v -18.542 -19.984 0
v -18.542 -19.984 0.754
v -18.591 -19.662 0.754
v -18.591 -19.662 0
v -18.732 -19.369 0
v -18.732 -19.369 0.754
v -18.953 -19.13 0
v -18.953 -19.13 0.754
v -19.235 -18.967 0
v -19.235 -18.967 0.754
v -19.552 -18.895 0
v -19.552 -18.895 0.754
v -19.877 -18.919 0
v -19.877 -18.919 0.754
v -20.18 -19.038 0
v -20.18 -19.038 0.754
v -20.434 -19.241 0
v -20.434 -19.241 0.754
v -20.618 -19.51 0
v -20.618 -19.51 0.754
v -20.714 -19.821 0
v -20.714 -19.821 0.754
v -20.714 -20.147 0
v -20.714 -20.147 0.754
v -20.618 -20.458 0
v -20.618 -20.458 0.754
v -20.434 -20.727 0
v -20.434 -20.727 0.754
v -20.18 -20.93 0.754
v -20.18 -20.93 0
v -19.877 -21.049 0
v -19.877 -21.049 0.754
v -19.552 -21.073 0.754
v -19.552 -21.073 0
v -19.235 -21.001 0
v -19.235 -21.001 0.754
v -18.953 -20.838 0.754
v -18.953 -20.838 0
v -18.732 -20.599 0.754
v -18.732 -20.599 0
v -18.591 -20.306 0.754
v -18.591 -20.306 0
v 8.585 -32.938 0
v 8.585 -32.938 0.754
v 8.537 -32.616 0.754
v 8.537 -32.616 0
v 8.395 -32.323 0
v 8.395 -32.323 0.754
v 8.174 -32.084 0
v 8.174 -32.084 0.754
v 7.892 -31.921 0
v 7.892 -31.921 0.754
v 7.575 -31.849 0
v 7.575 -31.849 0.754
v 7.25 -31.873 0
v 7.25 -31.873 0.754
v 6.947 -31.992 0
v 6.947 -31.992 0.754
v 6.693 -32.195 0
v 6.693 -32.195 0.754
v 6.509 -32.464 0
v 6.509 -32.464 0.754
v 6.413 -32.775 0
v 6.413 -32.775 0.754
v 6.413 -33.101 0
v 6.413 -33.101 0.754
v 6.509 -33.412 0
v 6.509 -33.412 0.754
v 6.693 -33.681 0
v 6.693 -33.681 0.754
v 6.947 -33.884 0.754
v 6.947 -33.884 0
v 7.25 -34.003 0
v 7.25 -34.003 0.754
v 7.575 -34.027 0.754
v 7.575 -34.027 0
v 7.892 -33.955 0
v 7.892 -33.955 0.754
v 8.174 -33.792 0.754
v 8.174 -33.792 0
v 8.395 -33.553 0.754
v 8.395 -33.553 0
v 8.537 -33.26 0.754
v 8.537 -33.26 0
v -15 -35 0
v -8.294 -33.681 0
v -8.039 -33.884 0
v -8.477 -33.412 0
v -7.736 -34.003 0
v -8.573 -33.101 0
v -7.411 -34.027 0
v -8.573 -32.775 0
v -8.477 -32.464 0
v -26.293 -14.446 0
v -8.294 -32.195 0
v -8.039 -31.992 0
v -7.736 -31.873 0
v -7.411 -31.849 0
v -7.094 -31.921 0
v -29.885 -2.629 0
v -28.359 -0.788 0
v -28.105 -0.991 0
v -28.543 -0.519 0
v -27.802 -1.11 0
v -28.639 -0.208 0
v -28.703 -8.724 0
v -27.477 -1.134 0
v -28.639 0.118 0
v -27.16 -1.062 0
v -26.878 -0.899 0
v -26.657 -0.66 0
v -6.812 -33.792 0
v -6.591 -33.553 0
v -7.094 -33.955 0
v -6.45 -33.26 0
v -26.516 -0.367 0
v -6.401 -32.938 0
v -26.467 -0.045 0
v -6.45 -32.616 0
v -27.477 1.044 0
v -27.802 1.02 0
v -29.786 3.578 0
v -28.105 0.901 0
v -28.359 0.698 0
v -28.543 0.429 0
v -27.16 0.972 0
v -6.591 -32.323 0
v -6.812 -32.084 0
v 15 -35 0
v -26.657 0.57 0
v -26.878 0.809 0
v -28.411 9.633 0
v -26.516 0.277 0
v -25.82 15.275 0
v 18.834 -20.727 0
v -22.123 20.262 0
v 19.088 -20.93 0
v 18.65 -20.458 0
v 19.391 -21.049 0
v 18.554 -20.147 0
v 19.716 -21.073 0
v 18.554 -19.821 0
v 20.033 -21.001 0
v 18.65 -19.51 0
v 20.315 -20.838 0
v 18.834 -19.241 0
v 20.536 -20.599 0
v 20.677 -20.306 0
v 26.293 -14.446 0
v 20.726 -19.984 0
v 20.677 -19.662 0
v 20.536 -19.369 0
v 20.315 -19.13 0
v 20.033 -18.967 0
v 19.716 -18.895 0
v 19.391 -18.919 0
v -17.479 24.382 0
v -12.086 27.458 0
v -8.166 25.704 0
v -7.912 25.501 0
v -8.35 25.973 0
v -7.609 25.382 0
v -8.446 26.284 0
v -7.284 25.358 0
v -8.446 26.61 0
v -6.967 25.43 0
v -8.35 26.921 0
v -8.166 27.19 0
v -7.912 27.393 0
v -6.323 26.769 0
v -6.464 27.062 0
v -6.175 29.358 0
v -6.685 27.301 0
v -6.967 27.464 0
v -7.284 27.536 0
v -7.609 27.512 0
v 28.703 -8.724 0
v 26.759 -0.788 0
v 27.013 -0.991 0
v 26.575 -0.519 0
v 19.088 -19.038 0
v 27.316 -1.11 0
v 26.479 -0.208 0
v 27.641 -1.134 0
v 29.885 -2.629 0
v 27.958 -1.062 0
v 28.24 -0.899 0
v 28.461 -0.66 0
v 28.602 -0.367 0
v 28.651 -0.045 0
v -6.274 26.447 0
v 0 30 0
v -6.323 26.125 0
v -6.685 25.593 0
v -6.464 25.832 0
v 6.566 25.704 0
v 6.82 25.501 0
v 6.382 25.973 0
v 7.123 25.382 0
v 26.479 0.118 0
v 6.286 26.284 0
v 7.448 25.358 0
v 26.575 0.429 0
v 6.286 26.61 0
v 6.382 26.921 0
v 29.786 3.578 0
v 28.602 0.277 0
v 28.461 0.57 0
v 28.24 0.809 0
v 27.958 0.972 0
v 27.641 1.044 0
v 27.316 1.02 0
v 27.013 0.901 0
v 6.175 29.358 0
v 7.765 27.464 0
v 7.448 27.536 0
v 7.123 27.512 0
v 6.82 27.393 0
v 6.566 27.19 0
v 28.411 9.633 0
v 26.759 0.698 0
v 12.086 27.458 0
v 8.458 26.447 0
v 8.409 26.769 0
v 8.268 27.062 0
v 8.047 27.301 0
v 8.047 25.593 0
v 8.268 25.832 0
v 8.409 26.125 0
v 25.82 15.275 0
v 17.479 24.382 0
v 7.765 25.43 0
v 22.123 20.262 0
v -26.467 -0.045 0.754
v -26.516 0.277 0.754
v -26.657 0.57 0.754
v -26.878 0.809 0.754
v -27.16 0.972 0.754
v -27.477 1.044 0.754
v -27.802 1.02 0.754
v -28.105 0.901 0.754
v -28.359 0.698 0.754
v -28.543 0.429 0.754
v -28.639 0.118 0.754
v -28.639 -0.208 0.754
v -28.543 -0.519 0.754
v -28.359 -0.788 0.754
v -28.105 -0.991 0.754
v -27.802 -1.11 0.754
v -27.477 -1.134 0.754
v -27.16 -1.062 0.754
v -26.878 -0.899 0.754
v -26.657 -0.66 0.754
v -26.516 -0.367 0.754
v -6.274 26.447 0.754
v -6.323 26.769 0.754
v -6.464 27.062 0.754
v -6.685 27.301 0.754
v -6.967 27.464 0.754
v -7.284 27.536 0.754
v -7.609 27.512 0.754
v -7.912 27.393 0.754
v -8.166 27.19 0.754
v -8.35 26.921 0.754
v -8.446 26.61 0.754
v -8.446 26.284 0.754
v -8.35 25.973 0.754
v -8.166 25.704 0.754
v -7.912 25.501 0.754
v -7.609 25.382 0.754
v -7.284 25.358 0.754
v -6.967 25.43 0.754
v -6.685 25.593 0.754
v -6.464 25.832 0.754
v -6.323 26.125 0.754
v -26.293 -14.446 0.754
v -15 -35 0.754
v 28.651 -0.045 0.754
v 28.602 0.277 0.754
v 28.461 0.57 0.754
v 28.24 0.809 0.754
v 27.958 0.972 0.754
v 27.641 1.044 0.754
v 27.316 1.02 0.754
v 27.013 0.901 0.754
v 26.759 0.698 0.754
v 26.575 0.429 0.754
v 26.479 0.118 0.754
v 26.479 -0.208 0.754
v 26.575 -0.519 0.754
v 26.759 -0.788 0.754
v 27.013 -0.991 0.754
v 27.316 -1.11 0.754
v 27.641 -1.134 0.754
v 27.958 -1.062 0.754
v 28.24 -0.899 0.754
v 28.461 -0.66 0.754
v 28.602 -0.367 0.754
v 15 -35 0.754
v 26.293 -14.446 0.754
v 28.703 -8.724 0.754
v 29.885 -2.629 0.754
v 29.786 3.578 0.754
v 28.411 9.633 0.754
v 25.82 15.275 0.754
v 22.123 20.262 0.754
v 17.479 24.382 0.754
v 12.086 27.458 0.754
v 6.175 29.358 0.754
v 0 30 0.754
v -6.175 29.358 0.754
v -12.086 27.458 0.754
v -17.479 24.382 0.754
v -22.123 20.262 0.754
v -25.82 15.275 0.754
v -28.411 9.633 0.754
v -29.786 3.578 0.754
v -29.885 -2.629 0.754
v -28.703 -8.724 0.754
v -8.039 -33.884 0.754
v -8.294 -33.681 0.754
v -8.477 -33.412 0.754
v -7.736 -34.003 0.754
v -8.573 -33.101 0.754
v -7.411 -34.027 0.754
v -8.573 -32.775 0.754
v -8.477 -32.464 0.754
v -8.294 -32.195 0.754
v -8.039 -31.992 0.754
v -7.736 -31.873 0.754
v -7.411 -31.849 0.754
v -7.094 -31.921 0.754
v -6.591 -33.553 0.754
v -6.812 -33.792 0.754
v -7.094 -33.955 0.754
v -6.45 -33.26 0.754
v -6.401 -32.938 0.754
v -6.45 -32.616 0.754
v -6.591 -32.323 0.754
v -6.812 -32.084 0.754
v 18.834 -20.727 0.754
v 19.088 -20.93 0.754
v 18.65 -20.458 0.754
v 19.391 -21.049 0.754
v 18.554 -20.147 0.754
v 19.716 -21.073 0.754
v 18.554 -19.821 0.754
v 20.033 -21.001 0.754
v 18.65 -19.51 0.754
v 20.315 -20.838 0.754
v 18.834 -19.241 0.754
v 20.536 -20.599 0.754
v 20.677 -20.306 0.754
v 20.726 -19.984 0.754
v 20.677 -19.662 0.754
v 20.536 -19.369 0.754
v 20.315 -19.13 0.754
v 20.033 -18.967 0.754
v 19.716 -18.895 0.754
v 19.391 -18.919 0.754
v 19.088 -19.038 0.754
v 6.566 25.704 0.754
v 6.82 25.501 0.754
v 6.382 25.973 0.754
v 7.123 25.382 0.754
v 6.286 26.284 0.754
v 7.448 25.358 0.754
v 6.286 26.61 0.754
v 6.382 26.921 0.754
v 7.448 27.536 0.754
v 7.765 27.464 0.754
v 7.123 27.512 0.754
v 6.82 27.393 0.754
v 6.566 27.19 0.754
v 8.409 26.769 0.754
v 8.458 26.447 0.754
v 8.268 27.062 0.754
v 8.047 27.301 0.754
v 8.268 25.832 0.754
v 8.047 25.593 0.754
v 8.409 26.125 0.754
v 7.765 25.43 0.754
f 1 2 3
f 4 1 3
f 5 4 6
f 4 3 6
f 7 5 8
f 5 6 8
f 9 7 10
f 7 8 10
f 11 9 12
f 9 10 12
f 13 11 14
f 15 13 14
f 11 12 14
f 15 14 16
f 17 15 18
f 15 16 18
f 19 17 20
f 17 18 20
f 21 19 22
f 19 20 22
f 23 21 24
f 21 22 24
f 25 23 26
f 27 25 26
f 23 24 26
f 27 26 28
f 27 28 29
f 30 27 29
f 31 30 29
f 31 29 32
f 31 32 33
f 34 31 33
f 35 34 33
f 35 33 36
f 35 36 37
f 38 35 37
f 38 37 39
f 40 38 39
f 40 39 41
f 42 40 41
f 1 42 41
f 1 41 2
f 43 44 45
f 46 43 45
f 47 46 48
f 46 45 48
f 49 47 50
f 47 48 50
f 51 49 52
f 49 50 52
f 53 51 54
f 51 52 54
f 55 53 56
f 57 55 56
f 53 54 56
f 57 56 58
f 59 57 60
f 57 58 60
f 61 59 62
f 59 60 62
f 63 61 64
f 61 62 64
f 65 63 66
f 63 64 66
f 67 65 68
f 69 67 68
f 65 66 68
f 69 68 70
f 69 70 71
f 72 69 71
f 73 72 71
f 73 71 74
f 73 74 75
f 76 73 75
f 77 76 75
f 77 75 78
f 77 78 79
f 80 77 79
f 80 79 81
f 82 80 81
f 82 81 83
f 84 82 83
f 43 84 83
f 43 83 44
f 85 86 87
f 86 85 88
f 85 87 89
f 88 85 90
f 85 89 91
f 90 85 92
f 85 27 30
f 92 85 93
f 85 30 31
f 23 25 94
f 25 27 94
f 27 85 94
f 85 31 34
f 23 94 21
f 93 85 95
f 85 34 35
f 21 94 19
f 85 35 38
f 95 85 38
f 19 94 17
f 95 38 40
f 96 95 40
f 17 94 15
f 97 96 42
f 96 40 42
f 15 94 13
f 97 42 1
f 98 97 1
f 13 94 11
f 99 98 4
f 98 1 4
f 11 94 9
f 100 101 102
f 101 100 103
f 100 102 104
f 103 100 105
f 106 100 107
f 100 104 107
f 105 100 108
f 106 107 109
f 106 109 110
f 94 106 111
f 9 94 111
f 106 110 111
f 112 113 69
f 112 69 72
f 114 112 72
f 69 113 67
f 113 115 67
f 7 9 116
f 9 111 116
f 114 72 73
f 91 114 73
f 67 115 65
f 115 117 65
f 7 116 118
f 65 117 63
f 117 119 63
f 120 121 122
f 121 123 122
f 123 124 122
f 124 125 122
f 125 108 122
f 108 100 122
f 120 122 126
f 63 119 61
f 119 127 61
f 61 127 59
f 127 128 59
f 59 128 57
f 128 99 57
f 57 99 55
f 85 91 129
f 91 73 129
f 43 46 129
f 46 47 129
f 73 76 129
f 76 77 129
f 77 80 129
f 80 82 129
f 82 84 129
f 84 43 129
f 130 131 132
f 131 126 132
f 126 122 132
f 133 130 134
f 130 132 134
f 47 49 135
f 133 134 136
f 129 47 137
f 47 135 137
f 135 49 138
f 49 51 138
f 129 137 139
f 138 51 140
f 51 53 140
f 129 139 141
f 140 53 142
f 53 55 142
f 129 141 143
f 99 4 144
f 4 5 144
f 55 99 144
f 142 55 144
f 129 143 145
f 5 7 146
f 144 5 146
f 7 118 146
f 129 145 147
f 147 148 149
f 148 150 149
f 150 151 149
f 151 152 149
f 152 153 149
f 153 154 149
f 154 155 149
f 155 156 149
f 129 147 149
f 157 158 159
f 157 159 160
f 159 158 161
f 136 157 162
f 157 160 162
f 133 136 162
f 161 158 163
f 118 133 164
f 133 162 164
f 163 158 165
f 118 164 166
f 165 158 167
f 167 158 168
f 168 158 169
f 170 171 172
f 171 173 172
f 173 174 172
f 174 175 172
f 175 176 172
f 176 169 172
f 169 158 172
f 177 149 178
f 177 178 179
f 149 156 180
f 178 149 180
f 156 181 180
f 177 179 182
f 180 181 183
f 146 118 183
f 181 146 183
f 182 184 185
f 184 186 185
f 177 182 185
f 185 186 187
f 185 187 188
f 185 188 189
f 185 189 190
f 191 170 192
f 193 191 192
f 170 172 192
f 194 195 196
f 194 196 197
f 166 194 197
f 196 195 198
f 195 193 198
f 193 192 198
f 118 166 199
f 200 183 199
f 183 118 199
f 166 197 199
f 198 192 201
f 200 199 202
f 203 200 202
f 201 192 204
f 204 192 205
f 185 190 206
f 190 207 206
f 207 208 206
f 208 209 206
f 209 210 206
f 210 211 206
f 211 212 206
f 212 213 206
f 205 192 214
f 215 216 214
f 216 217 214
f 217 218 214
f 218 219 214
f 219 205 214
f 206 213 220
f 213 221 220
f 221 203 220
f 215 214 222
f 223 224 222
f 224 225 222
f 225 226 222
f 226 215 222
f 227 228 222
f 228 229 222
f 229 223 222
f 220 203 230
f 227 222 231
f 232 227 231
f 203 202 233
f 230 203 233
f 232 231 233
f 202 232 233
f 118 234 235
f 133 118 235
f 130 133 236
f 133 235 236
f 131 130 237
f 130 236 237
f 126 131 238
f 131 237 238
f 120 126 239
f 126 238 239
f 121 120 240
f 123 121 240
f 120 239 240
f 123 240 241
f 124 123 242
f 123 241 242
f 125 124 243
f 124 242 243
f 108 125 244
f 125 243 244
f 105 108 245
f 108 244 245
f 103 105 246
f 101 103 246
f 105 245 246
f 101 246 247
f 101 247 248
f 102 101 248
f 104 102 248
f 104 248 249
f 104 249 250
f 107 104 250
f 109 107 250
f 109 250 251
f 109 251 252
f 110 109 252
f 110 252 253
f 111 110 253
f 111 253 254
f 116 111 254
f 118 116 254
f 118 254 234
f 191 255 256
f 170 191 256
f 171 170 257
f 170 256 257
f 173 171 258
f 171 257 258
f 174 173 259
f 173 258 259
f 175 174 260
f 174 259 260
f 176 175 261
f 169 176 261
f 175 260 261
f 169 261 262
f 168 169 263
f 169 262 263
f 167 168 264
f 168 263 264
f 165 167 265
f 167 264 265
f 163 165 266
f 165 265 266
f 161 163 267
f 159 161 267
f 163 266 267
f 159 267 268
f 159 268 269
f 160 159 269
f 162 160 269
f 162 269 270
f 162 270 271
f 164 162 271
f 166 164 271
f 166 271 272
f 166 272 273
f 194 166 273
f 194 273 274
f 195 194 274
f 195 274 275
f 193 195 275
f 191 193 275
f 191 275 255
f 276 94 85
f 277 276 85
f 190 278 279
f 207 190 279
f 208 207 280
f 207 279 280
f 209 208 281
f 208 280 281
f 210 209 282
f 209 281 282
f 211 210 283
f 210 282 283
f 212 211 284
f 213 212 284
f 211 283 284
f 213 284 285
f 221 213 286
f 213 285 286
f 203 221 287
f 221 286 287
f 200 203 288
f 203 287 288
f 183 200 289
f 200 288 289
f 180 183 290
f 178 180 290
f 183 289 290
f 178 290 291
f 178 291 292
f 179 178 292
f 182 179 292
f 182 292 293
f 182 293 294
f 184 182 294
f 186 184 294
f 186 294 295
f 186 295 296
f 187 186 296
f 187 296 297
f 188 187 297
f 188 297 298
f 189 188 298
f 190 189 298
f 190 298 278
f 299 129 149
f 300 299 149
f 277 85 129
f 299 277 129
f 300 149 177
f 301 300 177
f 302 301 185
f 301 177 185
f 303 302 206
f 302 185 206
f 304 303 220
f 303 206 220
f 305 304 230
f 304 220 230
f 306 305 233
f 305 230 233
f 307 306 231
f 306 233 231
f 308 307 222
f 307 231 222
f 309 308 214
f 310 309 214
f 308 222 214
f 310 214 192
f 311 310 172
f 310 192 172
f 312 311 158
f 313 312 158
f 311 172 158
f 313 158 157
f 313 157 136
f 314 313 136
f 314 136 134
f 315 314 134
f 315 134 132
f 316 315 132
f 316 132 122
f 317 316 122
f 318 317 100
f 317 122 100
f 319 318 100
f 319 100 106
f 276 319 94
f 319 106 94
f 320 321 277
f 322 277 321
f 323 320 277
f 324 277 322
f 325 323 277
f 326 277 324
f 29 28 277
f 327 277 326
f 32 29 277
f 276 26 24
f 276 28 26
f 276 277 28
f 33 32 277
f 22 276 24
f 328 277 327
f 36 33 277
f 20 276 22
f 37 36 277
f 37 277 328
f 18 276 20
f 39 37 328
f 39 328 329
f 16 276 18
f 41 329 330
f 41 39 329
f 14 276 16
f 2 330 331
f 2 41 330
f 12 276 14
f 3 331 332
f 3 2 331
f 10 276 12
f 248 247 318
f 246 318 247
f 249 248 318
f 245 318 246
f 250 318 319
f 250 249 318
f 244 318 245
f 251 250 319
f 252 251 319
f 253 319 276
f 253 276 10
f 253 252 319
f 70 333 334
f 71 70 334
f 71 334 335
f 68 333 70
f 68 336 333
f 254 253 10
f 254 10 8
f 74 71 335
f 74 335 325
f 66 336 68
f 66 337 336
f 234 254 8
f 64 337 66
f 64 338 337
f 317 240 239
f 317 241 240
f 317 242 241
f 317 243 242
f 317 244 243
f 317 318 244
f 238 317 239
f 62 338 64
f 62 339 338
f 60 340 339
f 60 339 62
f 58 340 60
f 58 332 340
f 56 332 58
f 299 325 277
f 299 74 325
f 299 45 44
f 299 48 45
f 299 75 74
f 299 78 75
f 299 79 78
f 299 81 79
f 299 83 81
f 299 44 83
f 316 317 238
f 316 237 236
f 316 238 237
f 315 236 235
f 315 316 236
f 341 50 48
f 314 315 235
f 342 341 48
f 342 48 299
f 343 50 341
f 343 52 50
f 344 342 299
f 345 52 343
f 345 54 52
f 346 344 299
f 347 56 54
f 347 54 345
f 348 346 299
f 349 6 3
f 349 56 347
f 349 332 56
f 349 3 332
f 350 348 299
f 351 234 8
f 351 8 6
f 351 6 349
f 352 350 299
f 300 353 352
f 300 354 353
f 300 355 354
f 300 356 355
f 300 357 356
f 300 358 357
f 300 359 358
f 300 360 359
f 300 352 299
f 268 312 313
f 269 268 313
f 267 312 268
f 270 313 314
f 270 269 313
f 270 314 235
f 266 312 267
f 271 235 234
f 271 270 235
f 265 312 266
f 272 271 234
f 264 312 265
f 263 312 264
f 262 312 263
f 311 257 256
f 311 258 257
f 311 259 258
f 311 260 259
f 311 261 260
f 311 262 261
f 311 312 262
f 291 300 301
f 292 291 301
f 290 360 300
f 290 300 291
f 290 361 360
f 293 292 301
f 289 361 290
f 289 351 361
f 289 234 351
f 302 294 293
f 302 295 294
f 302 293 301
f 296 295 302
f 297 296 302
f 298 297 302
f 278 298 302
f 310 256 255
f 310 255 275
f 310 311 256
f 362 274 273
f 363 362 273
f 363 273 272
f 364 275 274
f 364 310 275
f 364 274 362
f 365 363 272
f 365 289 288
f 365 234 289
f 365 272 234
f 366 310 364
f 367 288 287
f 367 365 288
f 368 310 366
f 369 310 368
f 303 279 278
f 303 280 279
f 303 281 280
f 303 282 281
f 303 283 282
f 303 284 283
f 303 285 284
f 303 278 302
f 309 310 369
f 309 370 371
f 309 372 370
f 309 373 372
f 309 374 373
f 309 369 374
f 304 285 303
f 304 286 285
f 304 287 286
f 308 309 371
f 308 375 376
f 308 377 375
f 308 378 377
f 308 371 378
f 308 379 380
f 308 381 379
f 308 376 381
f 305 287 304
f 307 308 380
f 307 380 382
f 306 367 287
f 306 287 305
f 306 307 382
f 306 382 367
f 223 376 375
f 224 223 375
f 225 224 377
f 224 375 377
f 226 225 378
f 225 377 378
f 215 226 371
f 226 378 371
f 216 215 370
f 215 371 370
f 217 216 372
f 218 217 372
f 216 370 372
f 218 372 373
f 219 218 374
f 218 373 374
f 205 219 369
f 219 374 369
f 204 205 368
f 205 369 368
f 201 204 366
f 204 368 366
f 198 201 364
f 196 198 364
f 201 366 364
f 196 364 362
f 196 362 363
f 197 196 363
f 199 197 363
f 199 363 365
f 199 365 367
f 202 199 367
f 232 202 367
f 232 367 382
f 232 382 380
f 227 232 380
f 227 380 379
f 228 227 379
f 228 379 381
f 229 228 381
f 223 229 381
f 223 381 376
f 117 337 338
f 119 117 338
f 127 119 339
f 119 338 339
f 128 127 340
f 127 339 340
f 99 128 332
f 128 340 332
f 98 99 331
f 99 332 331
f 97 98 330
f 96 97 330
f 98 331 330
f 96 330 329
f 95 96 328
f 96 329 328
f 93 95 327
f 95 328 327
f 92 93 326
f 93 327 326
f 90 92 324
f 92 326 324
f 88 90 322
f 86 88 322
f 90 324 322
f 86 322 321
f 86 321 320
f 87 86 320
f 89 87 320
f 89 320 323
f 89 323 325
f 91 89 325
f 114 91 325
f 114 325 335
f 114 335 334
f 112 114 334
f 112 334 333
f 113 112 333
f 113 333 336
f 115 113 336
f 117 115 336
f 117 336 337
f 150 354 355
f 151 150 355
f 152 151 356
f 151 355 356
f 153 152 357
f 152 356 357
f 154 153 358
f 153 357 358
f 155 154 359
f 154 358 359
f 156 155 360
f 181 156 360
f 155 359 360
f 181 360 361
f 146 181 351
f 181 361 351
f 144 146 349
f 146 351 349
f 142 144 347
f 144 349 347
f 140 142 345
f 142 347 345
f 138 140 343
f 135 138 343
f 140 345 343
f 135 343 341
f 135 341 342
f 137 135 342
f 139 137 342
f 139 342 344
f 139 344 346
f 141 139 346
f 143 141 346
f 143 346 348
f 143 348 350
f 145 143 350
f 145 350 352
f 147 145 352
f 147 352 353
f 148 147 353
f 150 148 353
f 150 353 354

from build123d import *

# Parameters (mm, degrees)
BOSS_EXTRUDE1_DEPTH   = 0.75438
ESBO_O1_R             = 1.09200001
CORTE_EXTRUS_O1_DEPTH = 10


with BuildPart() as part:
    # Sketch1 → Boss-Extrude1 (new body)
    with BuildSketch(Plane.XY):
        with BuildLine():
            Line((-15, -35), (15, -35))
            Line((15, -35), (26.292884648, -14.44590658))
            ThreePointArc((26.292884648, -14.44590658), (0, 30), (-26.292884648, -14.44590658))
            Line((-26.292884648, -14.44590658), (-15, -35))
        make_face()
    extrude(amount=BOSS_EXTRUDE1_DEPTH)

    # Esboço1 → Corte-extrusão1 (cut)
    with BuildSketch(Plane.XY.offset(0.75438)):
        with Locations((-7.4931, -32.938)):
            Circle(ESBO_O1_R)
        with Locations((-7.366, 26.4469878)):
            Circle(ESBO_O1_R)
        with Locations((-27.559, -0.0450022)):
            Circle(ESBO_O1_R)
        with Locations((-19.634, -19.9840012)):
            Circle(ESBO_O1_R)
        with Locations((7.366, 26.4469878)):
            Circle(ESBO_O1_R)
        with Locations((7.4931, -32.938)):
            Circle(ESBO_O1_R)
        with Locations((19.634, -19.9840012)):
            Circle(ESBO_O1_R)
        with Locations((27.559, -0.0450022)):
            Circle(ESBO_O1_R)
    extrude(amount=-CORTE_EXTRUS_O1_DEPTH, mode=Mode.SUBTRACT)


solid = part.part
